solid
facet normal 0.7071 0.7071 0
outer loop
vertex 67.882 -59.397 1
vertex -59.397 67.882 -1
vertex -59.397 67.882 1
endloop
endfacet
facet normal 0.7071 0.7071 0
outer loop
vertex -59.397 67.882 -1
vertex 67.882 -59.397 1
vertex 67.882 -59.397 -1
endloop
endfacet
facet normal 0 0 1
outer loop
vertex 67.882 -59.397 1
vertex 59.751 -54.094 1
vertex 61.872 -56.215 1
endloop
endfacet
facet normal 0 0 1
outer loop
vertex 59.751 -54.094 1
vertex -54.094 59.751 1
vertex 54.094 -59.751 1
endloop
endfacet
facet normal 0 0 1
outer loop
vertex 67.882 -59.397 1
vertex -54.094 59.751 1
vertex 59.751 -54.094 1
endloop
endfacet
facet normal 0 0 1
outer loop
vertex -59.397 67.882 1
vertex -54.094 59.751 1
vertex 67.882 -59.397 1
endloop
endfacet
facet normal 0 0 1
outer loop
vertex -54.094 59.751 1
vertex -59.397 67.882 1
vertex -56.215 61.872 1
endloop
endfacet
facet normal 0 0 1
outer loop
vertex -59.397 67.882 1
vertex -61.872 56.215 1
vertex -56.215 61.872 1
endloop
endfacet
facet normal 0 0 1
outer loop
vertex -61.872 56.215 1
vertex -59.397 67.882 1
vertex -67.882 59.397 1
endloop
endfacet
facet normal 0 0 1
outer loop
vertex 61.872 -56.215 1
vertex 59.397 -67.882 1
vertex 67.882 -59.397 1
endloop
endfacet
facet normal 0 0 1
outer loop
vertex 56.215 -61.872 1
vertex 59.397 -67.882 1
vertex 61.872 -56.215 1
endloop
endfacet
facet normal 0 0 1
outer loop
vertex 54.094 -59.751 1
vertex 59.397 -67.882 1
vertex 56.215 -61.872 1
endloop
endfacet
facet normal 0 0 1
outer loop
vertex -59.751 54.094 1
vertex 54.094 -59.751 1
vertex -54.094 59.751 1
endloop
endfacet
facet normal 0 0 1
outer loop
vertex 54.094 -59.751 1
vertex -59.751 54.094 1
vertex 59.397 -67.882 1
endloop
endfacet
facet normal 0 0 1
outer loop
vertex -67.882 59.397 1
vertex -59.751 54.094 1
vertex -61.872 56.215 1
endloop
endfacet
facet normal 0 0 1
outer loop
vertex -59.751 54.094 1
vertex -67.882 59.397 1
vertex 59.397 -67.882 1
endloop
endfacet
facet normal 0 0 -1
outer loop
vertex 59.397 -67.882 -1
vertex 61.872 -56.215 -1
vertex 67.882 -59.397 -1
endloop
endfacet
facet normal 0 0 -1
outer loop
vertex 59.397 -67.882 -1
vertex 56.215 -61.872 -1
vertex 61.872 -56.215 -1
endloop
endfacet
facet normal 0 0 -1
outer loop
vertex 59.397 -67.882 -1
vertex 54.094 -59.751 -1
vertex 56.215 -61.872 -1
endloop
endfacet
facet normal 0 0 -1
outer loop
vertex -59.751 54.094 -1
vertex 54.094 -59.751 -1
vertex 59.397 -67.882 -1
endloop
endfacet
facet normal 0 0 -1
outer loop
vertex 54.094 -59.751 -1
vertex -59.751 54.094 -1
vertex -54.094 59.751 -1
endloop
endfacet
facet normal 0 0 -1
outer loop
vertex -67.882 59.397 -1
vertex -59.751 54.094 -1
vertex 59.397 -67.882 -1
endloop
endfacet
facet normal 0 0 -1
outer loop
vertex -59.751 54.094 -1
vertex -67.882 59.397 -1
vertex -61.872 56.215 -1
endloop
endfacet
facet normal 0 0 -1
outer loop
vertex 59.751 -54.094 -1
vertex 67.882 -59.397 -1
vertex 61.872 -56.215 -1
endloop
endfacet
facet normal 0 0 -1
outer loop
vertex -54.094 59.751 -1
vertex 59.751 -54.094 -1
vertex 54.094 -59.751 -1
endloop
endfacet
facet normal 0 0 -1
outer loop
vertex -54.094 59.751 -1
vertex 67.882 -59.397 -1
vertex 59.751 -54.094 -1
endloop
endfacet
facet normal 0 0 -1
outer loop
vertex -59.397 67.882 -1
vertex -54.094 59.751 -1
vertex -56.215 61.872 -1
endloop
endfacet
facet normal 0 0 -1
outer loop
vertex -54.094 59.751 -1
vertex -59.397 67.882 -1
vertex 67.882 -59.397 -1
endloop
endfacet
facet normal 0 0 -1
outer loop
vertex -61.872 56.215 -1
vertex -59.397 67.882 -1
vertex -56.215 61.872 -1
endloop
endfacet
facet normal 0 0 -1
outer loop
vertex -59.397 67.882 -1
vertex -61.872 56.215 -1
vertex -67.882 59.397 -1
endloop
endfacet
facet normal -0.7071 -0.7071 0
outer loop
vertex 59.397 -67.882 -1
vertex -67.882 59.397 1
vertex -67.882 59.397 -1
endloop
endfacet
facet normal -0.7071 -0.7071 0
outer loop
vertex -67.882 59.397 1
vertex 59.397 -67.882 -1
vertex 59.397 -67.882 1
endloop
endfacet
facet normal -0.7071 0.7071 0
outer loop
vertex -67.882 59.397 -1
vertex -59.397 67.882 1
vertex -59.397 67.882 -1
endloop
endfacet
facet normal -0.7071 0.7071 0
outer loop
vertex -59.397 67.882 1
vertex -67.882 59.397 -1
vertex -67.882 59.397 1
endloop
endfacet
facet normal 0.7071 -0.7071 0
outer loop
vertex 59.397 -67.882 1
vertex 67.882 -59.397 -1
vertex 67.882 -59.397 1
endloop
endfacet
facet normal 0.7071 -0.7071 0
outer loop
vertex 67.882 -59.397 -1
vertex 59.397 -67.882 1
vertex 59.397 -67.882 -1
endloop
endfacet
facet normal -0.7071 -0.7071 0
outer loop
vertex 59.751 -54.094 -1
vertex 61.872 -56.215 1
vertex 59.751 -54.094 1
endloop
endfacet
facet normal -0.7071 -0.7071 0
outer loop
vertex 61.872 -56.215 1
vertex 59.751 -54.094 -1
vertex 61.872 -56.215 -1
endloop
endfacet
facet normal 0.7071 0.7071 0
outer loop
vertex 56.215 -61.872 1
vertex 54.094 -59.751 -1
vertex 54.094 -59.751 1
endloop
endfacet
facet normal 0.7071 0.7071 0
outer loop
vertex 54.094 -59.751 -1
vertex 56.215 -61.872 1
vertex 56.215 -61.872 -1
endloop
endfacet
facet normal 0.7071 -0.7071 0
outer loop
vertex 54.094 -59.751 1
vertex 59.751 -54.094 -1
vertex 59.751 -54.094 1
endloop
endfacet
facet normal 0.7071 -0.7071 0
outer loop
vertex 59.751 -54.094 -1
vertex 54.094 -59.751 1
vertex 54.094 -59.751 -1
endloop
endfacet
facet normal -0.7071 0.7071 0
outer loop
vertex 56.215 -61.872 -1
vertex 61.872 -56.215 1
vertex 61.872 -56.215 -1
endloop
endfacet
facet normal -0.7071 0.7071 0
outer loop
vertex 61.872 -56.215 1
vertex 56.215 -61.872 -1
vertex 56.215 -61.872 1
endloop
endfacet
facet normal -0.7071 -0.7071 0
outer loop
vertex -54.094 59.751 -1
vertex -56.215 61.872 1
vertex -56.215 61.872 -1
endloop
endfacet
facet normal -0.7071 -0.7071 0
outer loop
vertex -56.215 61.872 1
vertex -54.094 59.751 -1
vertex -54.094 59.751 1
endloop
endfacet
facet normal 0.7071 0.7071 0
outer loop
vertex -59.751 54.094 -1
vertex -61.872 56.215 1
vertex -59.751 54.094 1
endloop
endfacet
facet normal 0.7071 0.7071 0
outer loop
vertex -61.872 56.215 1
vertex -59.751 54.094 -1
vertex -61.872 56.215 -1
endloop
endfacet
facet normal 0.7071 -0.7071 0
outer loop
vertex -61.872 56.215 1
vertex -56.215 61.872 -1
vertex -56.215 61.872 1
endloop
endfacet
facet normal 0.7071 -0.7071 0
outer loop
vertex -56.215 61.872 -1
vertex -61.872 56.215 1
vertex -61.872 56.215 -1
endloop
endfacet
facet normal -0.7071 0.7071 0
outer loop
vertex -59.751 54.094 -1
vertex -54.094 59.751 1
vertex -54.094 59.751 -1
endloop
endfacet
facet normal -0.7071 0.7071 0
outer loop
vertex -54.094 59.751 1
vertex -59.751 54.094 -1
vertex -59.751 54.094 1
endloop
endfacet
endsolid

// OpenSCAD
//pieces for long part
rotate([0,0,45])
difference(){
cube([12,180,2],center=true);
translate([0,-82,0]) cube([8,3,4], center=true);
translate([0,82,0]) cube([8,3,4], center=true);
}
